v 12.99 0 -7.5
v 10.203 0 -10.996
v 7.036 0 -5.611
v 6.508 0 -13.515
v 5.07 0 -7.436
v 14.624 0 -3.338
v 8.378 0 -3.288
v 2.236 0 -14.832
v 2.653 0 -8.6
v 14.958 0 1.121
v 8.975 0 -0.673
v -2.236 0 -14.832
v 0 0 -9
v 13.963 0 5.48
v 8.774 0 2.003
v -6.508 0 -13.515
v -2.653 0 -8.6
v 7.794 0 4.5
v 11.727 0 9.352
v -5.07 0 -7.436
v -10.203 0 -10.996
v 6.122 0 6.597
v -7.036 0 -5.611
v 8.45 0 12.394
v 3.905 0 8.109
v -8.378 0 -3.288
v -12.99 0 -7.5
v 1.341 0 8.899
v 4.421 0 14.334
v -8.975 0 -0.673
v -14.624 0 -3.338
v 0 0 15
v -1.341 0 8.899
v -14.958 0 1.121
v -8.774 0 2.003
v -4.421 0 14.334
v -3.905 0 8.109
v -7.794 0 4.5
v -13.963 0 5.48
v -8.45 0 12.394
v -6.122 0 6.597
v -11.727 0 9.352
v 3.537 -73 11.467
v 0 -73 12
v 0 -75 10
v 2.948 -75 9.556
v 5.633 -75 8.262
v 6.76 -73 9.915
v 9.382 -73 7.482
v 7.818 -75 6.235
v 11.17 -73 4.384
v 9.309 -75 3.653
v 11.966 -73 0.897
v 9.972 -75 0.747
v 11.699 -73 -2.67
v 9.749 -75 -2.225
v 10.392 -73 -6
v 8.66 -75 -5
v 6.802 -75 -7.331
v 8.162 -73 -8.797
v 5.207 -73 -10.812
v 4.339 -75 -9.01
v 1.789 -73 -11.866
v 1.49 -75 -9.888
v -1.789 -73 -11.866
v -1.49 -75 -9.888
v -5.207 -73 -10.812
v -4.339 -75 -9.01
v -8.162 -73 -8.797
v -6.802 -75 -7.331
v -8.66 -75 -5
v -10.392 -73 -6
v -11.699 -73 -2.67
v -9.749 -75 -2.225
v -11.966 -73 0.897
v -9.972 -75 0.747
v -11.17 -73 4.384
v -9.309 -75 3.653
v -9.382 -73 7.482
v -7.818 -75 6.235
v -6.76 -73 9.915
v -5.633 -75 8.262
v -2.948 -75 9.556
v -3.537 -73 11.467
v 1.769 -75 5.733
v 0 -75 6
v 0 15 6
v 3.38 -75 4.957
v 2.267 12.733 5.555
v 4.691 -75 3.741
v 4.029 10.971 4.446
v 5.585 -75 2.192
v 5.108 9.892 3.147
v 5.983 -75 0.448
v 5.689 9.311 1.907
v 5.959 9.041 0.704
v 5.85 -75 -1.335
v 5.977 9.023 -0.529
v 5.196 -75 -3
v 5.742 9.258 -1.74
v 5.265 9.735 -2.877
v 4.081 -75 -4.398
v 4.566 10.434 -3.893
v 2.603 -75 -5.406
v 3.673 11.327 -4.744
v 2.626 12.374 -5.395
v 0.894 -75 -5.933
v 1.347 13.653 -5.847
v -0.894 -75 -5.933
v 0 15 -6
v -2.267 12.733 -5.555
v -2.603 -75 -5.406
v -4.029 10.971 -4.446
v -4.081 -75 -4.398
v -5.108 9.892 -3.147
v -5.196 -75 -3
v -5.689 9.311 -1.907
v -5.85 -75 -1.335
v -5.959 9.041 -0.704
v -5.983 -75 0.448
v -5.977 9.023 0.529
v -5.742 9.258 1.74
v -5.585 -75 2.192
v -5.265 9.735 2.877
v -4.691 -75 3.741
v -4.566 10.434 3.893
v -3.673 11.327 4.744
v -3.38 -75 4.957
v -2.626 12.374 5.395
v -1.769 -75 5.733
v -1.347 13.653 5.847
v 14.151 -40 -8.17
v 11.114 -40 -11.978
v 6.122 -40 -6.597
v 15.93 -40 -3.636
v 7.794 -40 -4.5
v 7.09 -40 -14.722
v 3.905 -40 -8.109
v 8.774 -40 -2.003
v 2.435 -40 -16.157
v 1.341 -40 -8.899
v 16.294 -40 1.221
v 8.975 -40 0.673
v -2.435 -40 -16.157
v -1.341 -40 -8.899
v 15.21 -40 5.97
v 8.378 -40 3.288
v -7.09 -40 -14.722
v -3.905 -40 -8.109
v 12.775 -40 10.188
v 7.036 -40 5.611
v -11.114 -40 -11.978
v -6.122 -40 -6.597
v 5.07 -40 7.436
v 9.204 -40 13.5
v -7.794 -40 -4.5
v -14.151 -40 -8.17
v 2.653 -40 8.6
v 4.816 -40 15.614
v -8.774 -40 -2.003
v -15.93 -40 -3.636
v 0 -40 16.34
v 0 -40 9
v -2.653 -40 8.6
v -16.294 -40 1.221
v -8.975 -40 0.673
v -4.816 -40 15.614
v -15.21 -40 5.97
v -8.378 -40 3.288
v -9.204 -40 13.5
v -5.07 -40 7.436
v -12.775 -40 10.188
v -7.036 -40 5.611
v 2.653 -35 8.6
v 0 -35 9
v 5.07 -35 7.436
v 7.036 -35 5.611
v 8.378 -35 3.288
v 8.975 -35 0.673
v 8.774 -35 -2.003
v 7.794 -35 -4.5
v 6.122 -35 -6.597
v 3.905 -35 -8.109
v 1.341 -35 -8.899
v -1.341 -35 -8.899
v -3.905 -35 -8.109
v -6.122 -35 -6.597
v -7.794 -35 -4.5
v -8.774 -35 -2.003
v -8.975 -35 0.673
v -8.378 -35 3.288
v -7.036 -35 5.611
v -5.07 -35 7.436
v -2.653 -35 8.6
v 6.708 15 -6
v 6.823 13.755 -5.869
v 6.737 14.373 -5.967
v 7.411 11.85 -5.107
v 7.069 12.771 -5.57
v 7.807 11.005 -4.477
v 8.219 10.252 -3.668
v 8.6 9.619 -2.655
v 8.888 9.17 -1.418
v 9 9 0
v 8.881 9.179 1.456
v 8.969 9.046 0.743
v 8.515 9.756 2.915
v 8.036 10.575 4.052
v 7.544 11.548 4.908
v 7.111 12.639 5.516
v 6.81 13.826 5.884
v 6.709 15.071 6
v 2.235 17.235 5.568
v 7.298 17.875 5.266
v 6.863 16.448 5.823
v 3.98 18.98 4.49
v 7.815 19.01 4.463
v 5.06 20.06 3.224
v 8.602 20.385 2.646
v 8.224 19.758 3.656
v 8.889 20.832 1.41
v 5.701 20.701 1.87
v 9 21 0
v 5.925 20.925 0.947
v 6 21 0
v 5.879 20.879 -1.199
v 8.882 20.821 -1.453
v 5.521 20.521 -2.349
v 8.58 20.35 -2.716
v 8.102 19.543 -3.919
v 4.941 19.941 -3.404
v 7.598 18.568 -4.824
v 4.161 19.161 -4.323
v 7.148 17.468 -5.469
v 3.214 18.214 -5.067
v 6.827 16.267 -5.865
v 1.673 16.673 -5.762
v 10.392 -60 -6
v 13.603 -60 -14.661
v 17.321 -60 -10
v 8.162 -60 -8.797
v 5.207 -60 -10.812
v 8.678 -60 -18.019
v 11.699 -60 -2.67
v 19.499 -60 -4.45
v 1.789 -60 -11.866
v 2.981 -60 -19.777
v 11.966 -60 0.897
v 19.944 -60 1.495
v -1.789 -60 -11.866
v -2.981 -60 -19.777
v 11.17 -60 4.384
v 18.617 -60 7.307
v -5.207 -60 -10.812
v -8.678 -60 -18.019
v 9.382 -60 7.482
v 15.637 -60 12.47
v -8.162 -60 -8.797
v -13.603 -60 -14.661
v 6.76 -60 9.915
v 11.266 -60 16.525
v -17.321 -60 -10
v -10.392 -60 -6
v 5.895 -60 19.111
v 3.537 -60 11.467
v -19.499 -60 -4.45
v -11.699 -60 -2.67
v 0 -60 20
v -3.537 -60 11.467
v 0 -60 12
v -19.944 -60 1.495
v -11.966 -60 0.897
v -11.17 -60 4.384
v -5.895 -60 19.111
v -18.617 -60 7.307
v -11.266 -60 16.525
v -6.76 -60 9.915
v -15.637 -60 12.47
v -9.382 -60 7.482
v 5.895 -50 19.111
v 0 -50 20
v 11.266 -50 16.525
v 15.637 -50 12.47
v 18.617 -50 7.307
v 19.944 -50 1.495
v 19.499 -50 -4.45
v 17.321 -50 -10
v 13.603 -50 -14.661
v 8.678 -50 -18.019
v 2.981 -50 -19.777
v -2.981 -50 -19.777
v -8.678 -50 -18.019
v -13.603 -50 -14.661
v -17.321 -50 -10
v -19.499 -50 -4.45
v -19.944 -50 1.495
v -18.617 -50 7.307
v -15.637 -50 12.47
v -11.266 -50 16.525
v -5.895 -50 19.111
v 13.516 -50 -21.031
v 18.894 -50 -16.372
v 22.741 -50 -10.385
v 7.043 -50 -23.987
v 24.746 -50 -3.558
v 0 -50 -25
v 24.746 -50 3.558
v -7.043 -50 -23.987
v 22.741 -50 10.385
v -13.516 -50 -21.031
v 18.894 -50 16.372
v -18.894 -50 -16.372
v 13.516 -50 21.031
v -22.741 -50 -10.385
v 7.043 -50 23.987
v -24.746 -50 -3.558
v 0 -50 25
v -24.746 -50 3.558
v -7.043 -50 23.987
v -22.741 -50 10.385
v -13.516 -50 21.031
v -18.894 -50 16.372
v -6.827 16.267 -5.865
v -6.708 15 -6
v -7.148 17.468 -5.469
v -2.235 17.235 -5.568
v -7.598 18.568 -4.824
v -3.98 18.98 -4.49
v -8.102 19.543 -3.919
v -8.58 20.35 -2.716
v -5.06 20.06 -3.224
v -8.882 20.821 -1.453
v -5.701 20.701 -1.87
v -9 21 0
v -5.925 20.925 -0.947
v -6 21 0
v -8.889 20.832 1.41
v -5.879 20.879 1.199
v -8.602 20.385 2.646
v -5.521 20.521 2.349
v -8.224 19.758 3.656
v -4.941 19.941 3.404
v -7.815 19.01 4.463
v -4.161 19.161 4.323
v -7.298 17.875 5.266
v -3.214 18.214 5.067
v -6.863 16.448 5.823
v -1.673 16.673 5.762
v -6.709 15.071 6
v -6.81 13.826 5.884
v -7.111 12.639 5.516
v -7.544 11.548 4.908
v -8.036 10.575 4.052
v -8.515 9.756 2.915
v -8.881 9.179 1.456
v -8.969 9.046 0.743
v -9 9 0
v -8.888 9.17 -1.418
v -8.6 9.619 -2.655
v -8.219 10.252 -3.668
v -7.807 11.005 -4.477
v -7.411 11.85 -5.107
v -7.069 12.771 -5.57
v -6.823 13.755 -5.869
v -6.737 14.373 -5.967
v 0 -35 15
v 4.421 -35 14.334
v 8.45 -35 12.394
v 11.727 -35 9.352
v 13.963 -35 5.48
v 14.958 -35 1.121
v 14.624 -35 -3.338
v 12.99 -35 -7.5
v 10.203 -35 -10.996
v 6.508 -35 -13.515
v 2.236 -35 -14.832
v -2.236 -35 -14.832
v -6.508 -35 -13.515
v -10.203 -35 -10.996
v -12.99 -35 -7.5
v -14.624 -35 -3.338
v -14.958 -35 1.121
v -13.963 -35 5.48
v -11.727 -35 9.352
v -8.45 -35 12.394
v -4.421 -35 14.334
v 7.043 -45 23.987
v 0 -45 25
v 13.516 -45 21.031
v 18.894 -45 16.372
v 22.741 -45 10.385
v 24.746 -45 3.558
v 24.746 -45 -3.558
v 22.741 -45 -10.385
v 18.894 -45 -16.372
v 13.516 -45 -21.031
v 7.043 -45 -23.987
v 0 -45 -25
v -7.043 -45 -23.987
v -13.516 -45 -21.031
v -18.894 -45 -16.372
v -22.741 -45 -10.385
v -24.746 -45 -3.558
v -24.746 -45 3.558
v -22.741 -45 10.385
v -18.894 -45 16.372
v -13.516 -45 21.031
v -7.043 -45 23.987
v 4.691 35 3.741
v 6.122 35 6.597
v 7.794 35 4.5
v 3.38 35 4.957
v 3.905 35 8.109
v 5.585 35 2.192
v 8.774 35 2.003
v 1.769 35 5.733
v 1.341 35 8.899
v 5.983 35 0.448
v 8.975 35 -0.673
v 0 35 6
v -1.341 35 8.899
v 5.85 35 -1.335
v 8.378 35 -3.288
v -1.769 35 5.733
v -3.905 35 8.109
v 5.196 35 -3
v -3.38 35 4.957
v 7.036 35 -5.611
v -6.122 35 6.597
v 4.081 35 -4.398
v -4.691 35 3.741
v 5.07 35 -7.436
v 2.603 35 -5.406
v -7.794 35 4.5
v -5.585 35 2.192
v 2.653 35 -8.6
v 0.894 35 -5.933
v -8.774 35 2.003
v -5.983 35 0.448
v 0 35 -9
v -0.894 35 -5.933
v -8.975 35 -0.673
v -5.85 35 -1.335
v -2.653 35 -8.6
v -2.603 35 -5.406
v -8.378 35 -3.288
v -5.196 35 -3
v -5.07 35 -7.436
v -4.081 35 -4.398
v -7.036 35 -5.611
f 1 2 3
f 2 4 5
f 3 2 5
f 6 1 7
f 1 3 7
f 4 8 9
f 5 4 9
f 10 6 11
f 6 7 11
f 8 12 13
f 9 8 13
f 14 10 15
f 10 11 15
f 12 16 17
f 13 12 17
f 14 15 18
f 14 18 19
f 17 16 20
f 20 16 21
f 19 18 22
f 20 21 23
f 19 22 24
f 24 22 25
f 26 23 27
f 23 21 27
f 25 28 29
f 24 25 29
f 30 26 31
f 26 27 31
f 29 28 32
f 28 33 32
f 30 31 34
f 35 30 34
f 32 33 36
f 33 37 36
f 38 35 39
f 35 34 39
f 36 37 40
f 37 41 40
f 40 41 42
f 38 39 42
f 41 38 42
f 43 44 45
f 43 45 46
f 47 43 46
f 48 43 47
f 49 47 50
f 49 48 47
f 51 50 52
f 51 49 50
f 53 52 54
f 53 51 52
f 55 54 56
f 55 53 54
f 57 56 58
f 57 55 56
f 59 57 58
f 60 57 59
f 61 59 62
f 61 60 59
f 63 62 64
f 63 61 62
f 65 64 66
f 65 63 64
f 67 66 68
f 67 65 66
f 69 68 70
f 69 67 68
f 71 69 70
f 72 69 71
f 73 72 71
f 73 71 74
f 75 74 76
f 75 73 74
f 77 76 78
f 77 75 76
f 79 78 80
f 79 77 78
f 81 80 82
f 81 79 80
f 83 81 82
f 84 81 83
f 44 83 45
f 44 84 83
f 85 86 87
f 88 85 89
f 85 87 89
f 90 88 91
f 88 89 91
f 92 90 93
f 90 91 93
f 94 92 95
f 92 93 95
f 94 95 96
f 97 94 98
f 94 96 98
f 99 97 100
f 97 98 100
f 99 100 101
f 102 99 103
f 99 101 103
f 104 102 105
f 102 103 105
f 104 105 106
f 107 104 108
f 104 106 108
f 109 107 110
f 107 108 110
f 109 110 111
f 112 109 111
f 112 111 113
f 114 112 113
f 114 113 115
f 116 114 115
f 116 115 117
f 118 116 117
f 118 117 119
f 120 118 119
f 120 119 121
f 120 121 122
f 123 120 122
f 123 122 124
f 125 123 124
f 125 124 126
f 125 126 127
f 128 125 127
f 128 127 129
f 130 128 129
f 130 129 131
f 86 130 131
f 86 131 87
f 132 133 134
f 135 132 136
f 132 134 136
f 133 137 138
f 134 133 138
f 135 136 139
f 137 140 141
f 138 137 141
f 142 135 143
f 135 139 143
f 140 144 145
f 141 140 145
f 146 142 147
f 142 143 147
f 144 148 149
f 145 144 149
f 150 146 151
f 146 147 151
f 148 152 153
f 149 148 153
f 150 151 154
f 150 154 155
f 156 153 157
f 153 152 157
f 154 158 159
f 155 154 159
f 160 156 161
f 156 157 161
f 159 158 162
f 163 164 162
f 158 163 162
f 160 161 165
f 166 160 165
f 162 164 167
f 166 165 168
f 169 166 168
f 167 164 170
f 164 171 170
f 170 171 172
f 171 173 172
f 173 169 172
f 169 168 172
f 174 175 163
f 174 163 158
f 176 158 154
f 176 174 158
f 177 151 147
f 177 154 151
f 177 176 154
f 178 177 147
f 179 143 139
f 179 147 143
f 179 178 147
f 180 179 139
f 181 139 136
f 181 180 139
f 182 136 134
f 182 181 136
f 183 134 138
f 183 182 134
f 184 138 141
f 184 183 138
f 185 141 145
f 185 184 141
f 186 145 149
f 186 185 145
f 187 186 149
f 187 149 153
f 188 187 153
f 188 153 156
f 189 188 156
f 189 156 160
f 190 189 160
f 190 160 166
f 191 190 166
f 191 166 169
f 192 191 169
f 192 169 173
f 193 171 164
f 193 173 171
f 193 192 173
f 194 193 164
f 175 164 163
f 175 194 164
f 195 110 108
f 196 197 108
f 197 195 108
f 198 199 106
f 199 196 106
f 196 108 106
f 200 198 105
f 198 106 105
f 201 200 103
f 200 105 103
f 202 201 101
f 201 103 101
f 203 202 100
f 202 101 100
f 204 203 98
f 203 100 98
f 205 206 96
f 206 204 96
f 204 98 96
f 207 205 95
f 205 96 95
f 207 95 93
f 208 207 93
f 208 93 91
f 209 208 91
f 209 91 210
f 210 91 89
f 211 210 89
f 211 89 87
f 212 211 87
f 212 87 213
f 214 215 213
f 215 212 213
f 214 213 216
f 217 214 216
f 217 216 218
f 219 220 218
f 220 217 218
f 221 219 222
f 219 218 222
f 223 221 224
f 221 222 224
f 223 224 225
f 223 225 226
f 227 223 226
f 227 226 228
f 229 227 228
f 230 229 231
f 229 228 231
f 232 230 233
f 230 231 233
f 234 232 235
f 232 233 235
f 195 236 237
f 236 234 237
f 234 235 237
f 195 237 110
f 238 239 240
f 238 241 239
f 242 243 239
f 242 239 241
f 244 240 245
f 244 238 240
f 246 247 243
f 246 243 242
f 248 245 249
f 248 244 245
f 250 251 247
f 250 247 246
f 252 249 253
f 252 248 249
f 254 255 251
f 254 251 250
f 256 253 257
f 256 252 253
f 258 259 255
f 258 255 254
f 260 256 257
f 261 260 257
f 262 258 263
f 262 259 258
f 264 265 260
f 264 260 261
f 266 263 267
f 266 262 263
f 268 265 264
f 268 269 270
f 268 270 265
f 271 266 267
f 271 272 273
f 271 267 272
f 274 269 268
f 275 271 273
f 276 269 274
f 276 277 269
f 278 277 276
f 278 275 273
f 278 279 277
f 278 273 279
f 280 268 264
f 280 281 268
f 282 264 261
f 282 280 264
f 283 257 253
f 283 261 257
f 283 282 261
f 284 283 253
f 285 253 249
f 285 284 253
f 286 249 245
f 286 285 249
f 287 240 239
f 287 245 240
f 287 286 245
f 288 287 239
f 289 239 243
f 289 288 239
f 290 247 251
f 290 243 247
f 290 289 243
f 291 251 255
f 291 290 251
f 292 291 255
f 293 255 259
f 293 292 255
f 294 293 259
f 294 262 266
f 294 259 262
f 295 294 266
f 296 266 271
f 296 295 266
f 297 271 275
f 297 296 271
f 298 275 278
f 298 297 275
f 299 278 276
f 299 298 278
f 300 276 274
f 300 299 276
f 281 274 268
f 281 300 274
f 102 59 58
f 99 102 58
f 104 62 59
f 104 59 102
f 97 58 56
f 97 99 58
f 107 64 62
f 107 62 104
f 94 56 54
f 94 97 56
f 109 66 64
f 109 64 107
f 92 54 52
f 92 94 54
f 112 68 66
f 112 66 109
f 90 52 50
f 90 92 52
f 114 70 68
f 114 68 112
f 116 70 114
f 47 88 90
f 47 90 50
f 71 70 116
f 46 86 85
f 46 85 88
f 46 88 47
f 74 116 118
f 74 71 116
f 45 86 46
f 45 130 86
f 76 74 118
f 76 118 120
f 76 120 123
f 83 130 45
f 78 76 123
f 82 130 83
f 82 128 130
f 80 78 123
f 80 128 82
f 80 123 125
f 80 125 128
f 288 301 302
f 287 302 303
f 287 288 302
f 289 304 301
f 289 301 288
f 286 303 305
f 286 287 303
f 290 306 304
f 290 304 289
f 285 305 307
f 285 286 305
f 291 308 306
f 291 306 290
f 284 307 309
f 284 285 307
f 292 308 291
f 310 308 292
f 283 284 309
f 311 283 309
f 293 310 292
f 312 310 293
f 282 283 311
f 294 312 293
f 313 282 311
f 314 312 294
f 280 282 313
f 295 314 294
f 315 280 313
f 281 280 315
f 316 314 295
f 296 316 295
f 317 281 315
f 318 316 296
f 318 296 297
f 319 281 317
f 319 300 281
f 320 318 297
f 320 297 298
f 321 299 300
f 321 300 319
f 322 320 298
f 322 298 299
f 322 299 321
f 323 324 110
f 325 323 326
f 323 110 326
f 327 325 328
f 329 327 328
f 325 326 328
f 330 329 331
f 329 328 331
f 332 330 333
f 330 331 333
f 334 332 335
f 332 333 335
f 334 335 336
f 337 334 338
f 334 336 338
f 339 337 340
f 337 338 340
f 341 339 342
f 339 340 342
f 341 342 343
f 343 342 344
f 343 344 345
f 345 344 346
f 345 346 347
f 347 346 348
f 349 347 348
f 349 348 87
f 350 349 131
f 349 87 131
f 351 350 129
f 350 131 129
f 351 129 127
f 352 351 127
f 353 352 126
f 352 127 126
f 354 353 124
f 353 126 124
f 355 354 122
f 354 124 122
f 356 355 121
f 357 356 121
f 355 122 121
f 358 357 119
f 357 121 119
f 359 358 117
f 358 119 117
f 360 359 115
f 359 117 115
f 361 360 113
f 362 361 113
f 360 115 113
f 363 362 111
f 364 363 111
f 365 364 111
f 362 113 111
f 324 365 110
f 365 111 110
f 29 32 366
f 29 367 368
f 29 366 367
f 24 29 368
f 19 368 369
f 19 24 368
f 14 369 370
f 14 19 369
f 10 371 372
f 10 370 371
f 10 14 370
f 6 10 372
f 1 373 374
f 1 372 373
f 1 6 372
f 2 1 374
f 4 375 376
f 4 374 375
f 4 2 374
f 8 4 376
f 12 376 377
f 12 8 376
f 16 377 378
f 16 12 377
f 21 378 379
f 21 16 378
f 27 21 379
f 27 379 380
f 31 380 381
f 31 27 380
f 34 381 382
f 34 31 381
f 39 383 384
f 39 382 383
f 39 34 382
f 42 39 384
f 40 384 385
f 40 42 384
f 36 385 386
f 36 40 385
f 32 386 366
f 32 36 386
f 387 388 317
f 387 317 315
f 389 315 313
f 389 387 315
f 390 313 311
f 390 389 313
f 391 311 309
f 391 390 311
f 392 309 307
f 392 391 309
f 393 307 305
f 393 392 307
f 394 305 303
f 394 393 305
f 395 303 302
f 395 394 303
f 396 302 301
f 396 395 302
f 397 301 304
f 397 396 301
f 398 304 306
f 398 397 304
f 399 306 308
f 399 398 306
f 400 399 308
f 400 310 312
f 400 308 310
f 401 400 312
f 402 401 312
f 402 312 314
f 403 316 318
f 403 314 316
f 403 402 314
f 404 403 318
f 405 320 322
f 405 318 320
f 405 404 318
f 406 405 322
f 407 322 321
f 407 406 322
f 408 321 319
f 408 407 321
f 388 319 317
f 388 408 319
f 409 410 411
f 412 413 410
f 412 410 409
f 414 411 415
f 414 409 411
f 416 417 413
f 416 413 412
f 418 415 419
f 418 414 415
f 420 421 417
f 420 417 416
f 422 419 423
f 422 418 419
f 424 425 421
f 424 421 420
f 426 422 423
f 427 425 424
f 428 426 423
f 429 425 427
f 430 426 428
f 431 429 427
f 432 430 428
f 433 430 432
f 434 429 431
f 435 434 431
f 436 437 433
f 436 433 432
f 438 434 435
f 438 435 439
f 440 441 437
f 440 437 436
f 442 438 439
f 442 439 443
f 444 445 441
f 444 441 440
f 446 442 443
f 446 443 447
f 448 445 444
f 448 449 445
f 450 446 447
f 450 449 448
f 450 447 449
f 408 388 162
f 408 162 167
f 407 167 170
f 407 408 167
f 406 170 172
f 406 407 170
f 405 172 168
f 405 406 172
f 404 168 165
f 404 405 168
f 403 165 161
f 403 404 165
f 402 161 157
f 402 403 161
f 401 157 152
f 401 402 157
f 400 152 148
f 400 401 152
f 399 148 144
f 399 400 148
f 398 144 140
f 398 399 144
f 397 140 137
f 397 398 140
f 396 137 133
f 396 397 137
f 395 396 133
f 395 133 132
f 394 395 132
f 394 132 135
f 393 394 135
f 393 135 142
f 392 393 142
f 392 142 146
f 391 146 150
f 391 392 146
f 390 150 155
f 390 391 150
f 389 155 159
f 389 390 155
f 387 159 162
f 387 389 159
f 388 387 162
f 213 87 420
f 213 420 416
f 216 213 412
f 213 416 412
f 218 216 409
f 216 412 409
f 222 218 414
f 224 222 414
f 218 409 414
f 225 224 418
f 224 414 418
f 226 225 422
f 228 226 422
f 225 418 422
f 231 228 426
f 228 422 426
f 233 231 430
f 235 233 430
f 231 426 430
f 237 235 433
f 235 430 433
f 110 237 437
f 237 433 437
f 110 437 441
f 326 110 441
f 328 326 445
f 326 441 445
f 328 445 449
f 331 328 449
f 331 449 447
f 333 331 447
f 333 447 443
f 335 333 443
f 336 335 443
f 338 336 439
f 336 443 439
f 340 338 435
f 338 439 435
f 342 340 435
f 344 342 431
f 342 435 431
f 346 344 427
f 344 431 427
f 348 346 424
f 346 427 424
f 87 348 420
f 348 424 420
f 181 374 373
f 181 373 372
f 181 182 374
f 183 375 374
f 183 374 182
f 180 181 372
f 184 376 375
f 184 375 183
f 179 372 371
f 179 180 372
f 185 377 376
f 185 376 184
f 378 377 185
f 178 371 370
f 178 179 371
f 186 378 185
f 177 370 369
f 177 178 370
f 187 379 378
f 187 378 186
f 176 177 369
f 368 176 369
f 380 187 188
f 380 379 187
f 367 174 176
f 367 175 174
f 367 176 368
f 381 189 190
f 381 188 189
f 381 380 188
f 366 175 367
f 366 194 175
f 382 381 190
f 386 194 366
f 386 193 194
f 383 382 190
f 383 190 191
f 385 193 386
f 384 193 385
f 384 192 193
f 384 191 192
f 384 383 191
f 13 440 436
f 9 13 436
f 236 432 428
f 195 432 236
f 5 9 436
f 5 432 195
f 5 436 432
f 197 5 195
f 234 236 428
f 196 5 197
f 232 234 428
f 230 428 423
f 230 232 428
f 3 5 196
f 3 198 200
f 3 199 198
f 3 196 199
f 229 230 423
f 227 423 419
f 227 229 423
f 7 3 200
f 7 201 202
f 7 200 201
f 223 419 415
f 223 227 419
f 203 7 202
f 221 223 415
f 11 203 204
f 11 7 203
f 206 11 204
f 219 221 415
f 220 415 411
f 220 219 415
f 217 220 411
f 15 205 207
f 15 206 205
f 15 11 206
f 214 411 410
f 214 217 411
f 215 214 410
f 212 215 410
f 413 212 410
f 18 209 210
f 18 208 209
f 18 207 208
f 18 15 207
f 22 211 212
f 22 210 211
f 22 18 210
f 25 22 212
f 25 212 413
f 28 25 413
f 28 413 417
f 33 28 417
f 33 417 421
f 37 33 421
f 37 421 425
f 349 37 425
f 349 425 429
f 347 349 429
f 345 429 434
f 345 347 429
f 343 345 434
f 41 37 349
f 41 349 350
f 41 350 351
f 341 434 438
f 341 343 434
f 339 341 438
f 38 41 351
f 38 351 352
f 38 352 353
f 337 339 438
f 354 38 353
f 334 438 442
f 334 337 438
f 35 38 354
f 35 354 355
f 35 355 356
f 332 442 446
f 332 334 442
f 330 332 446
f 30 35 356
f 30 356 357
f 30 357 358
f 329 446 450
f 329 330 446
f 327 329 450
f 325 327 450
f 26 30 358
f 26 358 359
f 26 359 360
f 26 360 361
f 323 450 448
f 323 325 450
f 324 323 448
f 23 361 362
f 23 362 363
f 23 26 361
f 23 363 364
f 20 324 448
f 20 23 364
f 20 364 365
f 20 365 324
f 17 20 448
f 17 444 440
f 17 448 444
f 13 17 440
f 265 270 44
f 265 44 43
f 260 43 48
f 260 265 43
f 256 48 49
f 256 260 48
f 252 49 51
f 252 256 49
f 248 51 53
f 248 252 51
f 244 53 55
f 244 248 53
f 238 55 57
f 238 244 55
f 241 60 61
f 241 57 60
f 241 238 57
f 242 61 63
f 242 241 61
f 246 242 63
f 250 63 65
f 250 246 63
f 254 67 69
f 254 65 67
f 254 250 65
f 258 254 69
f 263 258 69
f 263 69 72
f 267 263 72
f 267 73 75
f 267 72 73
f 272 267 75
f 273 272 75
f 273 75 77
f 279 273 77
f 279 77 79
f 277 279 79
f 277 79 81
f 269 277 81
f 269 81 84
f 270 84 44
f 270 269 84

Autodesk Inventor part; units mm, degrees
ref_plane "YZ Plane" through (0, 0, 0) normal (1, 0, 0) x (0, 1, 0)
ref_plane "XZ Plane" through (0, 0, 0) normal (0, 1, 0) x (-1, 0, 0)
ref_plane "XY Plane" through (0, 0, 0) normal (0, 0, 1) x (1, 0, 0)
sketch "Sketch2" plane through (0, 0, 0) normal (0, 1, 0) x (-1, 0, 0)
  circle A0 centre (0, 0) radius 9
  dimension "d0" = 18
extrude "Extrusion1" add sketch "Sketch2" along normal blind 35
sketch "Sketch3" plane through (0, 0, 0) normal (0, -1, 0) x (1, 0, 0)
  circle A0 centre (0, 0) radius 15
  dimension "d3" = 30
extrude "Extrusion2" add sketch "Sketch3" along normal blind 35
sketch "Sketch4" plane through (0, -35, 0) normal (0, -1, 0) x (1, 0, 0)
  circle A0 centre (0, 0) radius 9 projected
  circle A1 centre (0, 0) radius 9
extrude "Extrusion3" add sketch "Sketch4" along normal blind 5
ref_plane "Work Plane1" through (0, -40, 0) normal (0, 0, -1) x (-1, 0, 0)
sketch "Sketch7" plane through (0, -40, 0) normal (0, 0, -1) x (-1, 0, 0)
  point P0 (0, 40)
sketch "Sketch8" plane through (0, -40, 0) normal (0, 0, -1) x (-1, 0, 0)
  line L0 (-9, 0) -> (9, 0) projected
  line L1 (-15, 5) -> (15, 5) projected
  line L2 (0, 0) -> (15, 0) construction
  line L3 (-16.3397, 0) -> (-25, -5)
  line L4 (0, 0) -> (0, -5)
  line L5 (0, -5) -> (-25, -5)
  line L6 (0, 0) -> (-16.3397, 0)
  point P0 (0, 40)
  dimension "d21" = 5
  dimension "d22" = 25
revolve "Revolution1" add sketch "Sketch8" angle 360 about axis through (0, -40, 0) along (0, -1, 0)
sketch "Sketch9" plane through (0, -45, 0) normal (0, -1, 0) x (1, 0, 0)
  circle A0 centre (0, 0) radius 25
extrude "Extrusion5" add sketch "Sketch9" along normal blind 5
sketch "Sketch10" plane through (0, -50, 0) normal (0, -1, 0) x (1, 0, 0)
  circle A0 centre (0, 0) radius 20
  dimension "d26" = 40
extrude "Extrusion6" add sketch "Sketch10" along normal blind 10
sketch "Sketch11" plane through (0, -60, 0) normal (0, -1, 0) x (1, 0, 0)
  circle A0 centre (0, 0) radius 9 projected
  circle A1 centre (0, 0) radius 12
  dimension "d29" = 24
extrude "Extrusion7" add sketch "Sketch11" along normal blind 15 contours A0 | A1
sketch "Sketch12" plane through (0, 35, 0) normal (0, 1, 0) x (1, 0, 0)
  circle A0 centre (0, 0) radius 6
  dimension "d32" = 12
extrude "Extrusion8" cut sketch "Sketch12" against normal blind 120
sketch "Sketch13" plane through (0, -40, 0) normal (0, 0, -1) x (-1, 0, 0)
  circle A0 centre (0, 55) radius 6
  line L0 (9, 75) -> (-9, 75) projected
  line L1 (9, 40) -> (-9, 40) projected
  point P0 (0, 40)
  dimension "d45" = 12
  dimension "d47" = 15
extrude "Extrusion9" cut sketch "Sketch13" along normal mid plane 18
move or copy body "Move Body2" bodies to move or copy 1 copy no rotation origin (0, 0, 0) rotation axis (0, 1, 0) rotation angle -90
chamfer "Chamfer1" distance 2 angle 45 1 edges at (0, -75, -12)
properties part number "Vtulka"
